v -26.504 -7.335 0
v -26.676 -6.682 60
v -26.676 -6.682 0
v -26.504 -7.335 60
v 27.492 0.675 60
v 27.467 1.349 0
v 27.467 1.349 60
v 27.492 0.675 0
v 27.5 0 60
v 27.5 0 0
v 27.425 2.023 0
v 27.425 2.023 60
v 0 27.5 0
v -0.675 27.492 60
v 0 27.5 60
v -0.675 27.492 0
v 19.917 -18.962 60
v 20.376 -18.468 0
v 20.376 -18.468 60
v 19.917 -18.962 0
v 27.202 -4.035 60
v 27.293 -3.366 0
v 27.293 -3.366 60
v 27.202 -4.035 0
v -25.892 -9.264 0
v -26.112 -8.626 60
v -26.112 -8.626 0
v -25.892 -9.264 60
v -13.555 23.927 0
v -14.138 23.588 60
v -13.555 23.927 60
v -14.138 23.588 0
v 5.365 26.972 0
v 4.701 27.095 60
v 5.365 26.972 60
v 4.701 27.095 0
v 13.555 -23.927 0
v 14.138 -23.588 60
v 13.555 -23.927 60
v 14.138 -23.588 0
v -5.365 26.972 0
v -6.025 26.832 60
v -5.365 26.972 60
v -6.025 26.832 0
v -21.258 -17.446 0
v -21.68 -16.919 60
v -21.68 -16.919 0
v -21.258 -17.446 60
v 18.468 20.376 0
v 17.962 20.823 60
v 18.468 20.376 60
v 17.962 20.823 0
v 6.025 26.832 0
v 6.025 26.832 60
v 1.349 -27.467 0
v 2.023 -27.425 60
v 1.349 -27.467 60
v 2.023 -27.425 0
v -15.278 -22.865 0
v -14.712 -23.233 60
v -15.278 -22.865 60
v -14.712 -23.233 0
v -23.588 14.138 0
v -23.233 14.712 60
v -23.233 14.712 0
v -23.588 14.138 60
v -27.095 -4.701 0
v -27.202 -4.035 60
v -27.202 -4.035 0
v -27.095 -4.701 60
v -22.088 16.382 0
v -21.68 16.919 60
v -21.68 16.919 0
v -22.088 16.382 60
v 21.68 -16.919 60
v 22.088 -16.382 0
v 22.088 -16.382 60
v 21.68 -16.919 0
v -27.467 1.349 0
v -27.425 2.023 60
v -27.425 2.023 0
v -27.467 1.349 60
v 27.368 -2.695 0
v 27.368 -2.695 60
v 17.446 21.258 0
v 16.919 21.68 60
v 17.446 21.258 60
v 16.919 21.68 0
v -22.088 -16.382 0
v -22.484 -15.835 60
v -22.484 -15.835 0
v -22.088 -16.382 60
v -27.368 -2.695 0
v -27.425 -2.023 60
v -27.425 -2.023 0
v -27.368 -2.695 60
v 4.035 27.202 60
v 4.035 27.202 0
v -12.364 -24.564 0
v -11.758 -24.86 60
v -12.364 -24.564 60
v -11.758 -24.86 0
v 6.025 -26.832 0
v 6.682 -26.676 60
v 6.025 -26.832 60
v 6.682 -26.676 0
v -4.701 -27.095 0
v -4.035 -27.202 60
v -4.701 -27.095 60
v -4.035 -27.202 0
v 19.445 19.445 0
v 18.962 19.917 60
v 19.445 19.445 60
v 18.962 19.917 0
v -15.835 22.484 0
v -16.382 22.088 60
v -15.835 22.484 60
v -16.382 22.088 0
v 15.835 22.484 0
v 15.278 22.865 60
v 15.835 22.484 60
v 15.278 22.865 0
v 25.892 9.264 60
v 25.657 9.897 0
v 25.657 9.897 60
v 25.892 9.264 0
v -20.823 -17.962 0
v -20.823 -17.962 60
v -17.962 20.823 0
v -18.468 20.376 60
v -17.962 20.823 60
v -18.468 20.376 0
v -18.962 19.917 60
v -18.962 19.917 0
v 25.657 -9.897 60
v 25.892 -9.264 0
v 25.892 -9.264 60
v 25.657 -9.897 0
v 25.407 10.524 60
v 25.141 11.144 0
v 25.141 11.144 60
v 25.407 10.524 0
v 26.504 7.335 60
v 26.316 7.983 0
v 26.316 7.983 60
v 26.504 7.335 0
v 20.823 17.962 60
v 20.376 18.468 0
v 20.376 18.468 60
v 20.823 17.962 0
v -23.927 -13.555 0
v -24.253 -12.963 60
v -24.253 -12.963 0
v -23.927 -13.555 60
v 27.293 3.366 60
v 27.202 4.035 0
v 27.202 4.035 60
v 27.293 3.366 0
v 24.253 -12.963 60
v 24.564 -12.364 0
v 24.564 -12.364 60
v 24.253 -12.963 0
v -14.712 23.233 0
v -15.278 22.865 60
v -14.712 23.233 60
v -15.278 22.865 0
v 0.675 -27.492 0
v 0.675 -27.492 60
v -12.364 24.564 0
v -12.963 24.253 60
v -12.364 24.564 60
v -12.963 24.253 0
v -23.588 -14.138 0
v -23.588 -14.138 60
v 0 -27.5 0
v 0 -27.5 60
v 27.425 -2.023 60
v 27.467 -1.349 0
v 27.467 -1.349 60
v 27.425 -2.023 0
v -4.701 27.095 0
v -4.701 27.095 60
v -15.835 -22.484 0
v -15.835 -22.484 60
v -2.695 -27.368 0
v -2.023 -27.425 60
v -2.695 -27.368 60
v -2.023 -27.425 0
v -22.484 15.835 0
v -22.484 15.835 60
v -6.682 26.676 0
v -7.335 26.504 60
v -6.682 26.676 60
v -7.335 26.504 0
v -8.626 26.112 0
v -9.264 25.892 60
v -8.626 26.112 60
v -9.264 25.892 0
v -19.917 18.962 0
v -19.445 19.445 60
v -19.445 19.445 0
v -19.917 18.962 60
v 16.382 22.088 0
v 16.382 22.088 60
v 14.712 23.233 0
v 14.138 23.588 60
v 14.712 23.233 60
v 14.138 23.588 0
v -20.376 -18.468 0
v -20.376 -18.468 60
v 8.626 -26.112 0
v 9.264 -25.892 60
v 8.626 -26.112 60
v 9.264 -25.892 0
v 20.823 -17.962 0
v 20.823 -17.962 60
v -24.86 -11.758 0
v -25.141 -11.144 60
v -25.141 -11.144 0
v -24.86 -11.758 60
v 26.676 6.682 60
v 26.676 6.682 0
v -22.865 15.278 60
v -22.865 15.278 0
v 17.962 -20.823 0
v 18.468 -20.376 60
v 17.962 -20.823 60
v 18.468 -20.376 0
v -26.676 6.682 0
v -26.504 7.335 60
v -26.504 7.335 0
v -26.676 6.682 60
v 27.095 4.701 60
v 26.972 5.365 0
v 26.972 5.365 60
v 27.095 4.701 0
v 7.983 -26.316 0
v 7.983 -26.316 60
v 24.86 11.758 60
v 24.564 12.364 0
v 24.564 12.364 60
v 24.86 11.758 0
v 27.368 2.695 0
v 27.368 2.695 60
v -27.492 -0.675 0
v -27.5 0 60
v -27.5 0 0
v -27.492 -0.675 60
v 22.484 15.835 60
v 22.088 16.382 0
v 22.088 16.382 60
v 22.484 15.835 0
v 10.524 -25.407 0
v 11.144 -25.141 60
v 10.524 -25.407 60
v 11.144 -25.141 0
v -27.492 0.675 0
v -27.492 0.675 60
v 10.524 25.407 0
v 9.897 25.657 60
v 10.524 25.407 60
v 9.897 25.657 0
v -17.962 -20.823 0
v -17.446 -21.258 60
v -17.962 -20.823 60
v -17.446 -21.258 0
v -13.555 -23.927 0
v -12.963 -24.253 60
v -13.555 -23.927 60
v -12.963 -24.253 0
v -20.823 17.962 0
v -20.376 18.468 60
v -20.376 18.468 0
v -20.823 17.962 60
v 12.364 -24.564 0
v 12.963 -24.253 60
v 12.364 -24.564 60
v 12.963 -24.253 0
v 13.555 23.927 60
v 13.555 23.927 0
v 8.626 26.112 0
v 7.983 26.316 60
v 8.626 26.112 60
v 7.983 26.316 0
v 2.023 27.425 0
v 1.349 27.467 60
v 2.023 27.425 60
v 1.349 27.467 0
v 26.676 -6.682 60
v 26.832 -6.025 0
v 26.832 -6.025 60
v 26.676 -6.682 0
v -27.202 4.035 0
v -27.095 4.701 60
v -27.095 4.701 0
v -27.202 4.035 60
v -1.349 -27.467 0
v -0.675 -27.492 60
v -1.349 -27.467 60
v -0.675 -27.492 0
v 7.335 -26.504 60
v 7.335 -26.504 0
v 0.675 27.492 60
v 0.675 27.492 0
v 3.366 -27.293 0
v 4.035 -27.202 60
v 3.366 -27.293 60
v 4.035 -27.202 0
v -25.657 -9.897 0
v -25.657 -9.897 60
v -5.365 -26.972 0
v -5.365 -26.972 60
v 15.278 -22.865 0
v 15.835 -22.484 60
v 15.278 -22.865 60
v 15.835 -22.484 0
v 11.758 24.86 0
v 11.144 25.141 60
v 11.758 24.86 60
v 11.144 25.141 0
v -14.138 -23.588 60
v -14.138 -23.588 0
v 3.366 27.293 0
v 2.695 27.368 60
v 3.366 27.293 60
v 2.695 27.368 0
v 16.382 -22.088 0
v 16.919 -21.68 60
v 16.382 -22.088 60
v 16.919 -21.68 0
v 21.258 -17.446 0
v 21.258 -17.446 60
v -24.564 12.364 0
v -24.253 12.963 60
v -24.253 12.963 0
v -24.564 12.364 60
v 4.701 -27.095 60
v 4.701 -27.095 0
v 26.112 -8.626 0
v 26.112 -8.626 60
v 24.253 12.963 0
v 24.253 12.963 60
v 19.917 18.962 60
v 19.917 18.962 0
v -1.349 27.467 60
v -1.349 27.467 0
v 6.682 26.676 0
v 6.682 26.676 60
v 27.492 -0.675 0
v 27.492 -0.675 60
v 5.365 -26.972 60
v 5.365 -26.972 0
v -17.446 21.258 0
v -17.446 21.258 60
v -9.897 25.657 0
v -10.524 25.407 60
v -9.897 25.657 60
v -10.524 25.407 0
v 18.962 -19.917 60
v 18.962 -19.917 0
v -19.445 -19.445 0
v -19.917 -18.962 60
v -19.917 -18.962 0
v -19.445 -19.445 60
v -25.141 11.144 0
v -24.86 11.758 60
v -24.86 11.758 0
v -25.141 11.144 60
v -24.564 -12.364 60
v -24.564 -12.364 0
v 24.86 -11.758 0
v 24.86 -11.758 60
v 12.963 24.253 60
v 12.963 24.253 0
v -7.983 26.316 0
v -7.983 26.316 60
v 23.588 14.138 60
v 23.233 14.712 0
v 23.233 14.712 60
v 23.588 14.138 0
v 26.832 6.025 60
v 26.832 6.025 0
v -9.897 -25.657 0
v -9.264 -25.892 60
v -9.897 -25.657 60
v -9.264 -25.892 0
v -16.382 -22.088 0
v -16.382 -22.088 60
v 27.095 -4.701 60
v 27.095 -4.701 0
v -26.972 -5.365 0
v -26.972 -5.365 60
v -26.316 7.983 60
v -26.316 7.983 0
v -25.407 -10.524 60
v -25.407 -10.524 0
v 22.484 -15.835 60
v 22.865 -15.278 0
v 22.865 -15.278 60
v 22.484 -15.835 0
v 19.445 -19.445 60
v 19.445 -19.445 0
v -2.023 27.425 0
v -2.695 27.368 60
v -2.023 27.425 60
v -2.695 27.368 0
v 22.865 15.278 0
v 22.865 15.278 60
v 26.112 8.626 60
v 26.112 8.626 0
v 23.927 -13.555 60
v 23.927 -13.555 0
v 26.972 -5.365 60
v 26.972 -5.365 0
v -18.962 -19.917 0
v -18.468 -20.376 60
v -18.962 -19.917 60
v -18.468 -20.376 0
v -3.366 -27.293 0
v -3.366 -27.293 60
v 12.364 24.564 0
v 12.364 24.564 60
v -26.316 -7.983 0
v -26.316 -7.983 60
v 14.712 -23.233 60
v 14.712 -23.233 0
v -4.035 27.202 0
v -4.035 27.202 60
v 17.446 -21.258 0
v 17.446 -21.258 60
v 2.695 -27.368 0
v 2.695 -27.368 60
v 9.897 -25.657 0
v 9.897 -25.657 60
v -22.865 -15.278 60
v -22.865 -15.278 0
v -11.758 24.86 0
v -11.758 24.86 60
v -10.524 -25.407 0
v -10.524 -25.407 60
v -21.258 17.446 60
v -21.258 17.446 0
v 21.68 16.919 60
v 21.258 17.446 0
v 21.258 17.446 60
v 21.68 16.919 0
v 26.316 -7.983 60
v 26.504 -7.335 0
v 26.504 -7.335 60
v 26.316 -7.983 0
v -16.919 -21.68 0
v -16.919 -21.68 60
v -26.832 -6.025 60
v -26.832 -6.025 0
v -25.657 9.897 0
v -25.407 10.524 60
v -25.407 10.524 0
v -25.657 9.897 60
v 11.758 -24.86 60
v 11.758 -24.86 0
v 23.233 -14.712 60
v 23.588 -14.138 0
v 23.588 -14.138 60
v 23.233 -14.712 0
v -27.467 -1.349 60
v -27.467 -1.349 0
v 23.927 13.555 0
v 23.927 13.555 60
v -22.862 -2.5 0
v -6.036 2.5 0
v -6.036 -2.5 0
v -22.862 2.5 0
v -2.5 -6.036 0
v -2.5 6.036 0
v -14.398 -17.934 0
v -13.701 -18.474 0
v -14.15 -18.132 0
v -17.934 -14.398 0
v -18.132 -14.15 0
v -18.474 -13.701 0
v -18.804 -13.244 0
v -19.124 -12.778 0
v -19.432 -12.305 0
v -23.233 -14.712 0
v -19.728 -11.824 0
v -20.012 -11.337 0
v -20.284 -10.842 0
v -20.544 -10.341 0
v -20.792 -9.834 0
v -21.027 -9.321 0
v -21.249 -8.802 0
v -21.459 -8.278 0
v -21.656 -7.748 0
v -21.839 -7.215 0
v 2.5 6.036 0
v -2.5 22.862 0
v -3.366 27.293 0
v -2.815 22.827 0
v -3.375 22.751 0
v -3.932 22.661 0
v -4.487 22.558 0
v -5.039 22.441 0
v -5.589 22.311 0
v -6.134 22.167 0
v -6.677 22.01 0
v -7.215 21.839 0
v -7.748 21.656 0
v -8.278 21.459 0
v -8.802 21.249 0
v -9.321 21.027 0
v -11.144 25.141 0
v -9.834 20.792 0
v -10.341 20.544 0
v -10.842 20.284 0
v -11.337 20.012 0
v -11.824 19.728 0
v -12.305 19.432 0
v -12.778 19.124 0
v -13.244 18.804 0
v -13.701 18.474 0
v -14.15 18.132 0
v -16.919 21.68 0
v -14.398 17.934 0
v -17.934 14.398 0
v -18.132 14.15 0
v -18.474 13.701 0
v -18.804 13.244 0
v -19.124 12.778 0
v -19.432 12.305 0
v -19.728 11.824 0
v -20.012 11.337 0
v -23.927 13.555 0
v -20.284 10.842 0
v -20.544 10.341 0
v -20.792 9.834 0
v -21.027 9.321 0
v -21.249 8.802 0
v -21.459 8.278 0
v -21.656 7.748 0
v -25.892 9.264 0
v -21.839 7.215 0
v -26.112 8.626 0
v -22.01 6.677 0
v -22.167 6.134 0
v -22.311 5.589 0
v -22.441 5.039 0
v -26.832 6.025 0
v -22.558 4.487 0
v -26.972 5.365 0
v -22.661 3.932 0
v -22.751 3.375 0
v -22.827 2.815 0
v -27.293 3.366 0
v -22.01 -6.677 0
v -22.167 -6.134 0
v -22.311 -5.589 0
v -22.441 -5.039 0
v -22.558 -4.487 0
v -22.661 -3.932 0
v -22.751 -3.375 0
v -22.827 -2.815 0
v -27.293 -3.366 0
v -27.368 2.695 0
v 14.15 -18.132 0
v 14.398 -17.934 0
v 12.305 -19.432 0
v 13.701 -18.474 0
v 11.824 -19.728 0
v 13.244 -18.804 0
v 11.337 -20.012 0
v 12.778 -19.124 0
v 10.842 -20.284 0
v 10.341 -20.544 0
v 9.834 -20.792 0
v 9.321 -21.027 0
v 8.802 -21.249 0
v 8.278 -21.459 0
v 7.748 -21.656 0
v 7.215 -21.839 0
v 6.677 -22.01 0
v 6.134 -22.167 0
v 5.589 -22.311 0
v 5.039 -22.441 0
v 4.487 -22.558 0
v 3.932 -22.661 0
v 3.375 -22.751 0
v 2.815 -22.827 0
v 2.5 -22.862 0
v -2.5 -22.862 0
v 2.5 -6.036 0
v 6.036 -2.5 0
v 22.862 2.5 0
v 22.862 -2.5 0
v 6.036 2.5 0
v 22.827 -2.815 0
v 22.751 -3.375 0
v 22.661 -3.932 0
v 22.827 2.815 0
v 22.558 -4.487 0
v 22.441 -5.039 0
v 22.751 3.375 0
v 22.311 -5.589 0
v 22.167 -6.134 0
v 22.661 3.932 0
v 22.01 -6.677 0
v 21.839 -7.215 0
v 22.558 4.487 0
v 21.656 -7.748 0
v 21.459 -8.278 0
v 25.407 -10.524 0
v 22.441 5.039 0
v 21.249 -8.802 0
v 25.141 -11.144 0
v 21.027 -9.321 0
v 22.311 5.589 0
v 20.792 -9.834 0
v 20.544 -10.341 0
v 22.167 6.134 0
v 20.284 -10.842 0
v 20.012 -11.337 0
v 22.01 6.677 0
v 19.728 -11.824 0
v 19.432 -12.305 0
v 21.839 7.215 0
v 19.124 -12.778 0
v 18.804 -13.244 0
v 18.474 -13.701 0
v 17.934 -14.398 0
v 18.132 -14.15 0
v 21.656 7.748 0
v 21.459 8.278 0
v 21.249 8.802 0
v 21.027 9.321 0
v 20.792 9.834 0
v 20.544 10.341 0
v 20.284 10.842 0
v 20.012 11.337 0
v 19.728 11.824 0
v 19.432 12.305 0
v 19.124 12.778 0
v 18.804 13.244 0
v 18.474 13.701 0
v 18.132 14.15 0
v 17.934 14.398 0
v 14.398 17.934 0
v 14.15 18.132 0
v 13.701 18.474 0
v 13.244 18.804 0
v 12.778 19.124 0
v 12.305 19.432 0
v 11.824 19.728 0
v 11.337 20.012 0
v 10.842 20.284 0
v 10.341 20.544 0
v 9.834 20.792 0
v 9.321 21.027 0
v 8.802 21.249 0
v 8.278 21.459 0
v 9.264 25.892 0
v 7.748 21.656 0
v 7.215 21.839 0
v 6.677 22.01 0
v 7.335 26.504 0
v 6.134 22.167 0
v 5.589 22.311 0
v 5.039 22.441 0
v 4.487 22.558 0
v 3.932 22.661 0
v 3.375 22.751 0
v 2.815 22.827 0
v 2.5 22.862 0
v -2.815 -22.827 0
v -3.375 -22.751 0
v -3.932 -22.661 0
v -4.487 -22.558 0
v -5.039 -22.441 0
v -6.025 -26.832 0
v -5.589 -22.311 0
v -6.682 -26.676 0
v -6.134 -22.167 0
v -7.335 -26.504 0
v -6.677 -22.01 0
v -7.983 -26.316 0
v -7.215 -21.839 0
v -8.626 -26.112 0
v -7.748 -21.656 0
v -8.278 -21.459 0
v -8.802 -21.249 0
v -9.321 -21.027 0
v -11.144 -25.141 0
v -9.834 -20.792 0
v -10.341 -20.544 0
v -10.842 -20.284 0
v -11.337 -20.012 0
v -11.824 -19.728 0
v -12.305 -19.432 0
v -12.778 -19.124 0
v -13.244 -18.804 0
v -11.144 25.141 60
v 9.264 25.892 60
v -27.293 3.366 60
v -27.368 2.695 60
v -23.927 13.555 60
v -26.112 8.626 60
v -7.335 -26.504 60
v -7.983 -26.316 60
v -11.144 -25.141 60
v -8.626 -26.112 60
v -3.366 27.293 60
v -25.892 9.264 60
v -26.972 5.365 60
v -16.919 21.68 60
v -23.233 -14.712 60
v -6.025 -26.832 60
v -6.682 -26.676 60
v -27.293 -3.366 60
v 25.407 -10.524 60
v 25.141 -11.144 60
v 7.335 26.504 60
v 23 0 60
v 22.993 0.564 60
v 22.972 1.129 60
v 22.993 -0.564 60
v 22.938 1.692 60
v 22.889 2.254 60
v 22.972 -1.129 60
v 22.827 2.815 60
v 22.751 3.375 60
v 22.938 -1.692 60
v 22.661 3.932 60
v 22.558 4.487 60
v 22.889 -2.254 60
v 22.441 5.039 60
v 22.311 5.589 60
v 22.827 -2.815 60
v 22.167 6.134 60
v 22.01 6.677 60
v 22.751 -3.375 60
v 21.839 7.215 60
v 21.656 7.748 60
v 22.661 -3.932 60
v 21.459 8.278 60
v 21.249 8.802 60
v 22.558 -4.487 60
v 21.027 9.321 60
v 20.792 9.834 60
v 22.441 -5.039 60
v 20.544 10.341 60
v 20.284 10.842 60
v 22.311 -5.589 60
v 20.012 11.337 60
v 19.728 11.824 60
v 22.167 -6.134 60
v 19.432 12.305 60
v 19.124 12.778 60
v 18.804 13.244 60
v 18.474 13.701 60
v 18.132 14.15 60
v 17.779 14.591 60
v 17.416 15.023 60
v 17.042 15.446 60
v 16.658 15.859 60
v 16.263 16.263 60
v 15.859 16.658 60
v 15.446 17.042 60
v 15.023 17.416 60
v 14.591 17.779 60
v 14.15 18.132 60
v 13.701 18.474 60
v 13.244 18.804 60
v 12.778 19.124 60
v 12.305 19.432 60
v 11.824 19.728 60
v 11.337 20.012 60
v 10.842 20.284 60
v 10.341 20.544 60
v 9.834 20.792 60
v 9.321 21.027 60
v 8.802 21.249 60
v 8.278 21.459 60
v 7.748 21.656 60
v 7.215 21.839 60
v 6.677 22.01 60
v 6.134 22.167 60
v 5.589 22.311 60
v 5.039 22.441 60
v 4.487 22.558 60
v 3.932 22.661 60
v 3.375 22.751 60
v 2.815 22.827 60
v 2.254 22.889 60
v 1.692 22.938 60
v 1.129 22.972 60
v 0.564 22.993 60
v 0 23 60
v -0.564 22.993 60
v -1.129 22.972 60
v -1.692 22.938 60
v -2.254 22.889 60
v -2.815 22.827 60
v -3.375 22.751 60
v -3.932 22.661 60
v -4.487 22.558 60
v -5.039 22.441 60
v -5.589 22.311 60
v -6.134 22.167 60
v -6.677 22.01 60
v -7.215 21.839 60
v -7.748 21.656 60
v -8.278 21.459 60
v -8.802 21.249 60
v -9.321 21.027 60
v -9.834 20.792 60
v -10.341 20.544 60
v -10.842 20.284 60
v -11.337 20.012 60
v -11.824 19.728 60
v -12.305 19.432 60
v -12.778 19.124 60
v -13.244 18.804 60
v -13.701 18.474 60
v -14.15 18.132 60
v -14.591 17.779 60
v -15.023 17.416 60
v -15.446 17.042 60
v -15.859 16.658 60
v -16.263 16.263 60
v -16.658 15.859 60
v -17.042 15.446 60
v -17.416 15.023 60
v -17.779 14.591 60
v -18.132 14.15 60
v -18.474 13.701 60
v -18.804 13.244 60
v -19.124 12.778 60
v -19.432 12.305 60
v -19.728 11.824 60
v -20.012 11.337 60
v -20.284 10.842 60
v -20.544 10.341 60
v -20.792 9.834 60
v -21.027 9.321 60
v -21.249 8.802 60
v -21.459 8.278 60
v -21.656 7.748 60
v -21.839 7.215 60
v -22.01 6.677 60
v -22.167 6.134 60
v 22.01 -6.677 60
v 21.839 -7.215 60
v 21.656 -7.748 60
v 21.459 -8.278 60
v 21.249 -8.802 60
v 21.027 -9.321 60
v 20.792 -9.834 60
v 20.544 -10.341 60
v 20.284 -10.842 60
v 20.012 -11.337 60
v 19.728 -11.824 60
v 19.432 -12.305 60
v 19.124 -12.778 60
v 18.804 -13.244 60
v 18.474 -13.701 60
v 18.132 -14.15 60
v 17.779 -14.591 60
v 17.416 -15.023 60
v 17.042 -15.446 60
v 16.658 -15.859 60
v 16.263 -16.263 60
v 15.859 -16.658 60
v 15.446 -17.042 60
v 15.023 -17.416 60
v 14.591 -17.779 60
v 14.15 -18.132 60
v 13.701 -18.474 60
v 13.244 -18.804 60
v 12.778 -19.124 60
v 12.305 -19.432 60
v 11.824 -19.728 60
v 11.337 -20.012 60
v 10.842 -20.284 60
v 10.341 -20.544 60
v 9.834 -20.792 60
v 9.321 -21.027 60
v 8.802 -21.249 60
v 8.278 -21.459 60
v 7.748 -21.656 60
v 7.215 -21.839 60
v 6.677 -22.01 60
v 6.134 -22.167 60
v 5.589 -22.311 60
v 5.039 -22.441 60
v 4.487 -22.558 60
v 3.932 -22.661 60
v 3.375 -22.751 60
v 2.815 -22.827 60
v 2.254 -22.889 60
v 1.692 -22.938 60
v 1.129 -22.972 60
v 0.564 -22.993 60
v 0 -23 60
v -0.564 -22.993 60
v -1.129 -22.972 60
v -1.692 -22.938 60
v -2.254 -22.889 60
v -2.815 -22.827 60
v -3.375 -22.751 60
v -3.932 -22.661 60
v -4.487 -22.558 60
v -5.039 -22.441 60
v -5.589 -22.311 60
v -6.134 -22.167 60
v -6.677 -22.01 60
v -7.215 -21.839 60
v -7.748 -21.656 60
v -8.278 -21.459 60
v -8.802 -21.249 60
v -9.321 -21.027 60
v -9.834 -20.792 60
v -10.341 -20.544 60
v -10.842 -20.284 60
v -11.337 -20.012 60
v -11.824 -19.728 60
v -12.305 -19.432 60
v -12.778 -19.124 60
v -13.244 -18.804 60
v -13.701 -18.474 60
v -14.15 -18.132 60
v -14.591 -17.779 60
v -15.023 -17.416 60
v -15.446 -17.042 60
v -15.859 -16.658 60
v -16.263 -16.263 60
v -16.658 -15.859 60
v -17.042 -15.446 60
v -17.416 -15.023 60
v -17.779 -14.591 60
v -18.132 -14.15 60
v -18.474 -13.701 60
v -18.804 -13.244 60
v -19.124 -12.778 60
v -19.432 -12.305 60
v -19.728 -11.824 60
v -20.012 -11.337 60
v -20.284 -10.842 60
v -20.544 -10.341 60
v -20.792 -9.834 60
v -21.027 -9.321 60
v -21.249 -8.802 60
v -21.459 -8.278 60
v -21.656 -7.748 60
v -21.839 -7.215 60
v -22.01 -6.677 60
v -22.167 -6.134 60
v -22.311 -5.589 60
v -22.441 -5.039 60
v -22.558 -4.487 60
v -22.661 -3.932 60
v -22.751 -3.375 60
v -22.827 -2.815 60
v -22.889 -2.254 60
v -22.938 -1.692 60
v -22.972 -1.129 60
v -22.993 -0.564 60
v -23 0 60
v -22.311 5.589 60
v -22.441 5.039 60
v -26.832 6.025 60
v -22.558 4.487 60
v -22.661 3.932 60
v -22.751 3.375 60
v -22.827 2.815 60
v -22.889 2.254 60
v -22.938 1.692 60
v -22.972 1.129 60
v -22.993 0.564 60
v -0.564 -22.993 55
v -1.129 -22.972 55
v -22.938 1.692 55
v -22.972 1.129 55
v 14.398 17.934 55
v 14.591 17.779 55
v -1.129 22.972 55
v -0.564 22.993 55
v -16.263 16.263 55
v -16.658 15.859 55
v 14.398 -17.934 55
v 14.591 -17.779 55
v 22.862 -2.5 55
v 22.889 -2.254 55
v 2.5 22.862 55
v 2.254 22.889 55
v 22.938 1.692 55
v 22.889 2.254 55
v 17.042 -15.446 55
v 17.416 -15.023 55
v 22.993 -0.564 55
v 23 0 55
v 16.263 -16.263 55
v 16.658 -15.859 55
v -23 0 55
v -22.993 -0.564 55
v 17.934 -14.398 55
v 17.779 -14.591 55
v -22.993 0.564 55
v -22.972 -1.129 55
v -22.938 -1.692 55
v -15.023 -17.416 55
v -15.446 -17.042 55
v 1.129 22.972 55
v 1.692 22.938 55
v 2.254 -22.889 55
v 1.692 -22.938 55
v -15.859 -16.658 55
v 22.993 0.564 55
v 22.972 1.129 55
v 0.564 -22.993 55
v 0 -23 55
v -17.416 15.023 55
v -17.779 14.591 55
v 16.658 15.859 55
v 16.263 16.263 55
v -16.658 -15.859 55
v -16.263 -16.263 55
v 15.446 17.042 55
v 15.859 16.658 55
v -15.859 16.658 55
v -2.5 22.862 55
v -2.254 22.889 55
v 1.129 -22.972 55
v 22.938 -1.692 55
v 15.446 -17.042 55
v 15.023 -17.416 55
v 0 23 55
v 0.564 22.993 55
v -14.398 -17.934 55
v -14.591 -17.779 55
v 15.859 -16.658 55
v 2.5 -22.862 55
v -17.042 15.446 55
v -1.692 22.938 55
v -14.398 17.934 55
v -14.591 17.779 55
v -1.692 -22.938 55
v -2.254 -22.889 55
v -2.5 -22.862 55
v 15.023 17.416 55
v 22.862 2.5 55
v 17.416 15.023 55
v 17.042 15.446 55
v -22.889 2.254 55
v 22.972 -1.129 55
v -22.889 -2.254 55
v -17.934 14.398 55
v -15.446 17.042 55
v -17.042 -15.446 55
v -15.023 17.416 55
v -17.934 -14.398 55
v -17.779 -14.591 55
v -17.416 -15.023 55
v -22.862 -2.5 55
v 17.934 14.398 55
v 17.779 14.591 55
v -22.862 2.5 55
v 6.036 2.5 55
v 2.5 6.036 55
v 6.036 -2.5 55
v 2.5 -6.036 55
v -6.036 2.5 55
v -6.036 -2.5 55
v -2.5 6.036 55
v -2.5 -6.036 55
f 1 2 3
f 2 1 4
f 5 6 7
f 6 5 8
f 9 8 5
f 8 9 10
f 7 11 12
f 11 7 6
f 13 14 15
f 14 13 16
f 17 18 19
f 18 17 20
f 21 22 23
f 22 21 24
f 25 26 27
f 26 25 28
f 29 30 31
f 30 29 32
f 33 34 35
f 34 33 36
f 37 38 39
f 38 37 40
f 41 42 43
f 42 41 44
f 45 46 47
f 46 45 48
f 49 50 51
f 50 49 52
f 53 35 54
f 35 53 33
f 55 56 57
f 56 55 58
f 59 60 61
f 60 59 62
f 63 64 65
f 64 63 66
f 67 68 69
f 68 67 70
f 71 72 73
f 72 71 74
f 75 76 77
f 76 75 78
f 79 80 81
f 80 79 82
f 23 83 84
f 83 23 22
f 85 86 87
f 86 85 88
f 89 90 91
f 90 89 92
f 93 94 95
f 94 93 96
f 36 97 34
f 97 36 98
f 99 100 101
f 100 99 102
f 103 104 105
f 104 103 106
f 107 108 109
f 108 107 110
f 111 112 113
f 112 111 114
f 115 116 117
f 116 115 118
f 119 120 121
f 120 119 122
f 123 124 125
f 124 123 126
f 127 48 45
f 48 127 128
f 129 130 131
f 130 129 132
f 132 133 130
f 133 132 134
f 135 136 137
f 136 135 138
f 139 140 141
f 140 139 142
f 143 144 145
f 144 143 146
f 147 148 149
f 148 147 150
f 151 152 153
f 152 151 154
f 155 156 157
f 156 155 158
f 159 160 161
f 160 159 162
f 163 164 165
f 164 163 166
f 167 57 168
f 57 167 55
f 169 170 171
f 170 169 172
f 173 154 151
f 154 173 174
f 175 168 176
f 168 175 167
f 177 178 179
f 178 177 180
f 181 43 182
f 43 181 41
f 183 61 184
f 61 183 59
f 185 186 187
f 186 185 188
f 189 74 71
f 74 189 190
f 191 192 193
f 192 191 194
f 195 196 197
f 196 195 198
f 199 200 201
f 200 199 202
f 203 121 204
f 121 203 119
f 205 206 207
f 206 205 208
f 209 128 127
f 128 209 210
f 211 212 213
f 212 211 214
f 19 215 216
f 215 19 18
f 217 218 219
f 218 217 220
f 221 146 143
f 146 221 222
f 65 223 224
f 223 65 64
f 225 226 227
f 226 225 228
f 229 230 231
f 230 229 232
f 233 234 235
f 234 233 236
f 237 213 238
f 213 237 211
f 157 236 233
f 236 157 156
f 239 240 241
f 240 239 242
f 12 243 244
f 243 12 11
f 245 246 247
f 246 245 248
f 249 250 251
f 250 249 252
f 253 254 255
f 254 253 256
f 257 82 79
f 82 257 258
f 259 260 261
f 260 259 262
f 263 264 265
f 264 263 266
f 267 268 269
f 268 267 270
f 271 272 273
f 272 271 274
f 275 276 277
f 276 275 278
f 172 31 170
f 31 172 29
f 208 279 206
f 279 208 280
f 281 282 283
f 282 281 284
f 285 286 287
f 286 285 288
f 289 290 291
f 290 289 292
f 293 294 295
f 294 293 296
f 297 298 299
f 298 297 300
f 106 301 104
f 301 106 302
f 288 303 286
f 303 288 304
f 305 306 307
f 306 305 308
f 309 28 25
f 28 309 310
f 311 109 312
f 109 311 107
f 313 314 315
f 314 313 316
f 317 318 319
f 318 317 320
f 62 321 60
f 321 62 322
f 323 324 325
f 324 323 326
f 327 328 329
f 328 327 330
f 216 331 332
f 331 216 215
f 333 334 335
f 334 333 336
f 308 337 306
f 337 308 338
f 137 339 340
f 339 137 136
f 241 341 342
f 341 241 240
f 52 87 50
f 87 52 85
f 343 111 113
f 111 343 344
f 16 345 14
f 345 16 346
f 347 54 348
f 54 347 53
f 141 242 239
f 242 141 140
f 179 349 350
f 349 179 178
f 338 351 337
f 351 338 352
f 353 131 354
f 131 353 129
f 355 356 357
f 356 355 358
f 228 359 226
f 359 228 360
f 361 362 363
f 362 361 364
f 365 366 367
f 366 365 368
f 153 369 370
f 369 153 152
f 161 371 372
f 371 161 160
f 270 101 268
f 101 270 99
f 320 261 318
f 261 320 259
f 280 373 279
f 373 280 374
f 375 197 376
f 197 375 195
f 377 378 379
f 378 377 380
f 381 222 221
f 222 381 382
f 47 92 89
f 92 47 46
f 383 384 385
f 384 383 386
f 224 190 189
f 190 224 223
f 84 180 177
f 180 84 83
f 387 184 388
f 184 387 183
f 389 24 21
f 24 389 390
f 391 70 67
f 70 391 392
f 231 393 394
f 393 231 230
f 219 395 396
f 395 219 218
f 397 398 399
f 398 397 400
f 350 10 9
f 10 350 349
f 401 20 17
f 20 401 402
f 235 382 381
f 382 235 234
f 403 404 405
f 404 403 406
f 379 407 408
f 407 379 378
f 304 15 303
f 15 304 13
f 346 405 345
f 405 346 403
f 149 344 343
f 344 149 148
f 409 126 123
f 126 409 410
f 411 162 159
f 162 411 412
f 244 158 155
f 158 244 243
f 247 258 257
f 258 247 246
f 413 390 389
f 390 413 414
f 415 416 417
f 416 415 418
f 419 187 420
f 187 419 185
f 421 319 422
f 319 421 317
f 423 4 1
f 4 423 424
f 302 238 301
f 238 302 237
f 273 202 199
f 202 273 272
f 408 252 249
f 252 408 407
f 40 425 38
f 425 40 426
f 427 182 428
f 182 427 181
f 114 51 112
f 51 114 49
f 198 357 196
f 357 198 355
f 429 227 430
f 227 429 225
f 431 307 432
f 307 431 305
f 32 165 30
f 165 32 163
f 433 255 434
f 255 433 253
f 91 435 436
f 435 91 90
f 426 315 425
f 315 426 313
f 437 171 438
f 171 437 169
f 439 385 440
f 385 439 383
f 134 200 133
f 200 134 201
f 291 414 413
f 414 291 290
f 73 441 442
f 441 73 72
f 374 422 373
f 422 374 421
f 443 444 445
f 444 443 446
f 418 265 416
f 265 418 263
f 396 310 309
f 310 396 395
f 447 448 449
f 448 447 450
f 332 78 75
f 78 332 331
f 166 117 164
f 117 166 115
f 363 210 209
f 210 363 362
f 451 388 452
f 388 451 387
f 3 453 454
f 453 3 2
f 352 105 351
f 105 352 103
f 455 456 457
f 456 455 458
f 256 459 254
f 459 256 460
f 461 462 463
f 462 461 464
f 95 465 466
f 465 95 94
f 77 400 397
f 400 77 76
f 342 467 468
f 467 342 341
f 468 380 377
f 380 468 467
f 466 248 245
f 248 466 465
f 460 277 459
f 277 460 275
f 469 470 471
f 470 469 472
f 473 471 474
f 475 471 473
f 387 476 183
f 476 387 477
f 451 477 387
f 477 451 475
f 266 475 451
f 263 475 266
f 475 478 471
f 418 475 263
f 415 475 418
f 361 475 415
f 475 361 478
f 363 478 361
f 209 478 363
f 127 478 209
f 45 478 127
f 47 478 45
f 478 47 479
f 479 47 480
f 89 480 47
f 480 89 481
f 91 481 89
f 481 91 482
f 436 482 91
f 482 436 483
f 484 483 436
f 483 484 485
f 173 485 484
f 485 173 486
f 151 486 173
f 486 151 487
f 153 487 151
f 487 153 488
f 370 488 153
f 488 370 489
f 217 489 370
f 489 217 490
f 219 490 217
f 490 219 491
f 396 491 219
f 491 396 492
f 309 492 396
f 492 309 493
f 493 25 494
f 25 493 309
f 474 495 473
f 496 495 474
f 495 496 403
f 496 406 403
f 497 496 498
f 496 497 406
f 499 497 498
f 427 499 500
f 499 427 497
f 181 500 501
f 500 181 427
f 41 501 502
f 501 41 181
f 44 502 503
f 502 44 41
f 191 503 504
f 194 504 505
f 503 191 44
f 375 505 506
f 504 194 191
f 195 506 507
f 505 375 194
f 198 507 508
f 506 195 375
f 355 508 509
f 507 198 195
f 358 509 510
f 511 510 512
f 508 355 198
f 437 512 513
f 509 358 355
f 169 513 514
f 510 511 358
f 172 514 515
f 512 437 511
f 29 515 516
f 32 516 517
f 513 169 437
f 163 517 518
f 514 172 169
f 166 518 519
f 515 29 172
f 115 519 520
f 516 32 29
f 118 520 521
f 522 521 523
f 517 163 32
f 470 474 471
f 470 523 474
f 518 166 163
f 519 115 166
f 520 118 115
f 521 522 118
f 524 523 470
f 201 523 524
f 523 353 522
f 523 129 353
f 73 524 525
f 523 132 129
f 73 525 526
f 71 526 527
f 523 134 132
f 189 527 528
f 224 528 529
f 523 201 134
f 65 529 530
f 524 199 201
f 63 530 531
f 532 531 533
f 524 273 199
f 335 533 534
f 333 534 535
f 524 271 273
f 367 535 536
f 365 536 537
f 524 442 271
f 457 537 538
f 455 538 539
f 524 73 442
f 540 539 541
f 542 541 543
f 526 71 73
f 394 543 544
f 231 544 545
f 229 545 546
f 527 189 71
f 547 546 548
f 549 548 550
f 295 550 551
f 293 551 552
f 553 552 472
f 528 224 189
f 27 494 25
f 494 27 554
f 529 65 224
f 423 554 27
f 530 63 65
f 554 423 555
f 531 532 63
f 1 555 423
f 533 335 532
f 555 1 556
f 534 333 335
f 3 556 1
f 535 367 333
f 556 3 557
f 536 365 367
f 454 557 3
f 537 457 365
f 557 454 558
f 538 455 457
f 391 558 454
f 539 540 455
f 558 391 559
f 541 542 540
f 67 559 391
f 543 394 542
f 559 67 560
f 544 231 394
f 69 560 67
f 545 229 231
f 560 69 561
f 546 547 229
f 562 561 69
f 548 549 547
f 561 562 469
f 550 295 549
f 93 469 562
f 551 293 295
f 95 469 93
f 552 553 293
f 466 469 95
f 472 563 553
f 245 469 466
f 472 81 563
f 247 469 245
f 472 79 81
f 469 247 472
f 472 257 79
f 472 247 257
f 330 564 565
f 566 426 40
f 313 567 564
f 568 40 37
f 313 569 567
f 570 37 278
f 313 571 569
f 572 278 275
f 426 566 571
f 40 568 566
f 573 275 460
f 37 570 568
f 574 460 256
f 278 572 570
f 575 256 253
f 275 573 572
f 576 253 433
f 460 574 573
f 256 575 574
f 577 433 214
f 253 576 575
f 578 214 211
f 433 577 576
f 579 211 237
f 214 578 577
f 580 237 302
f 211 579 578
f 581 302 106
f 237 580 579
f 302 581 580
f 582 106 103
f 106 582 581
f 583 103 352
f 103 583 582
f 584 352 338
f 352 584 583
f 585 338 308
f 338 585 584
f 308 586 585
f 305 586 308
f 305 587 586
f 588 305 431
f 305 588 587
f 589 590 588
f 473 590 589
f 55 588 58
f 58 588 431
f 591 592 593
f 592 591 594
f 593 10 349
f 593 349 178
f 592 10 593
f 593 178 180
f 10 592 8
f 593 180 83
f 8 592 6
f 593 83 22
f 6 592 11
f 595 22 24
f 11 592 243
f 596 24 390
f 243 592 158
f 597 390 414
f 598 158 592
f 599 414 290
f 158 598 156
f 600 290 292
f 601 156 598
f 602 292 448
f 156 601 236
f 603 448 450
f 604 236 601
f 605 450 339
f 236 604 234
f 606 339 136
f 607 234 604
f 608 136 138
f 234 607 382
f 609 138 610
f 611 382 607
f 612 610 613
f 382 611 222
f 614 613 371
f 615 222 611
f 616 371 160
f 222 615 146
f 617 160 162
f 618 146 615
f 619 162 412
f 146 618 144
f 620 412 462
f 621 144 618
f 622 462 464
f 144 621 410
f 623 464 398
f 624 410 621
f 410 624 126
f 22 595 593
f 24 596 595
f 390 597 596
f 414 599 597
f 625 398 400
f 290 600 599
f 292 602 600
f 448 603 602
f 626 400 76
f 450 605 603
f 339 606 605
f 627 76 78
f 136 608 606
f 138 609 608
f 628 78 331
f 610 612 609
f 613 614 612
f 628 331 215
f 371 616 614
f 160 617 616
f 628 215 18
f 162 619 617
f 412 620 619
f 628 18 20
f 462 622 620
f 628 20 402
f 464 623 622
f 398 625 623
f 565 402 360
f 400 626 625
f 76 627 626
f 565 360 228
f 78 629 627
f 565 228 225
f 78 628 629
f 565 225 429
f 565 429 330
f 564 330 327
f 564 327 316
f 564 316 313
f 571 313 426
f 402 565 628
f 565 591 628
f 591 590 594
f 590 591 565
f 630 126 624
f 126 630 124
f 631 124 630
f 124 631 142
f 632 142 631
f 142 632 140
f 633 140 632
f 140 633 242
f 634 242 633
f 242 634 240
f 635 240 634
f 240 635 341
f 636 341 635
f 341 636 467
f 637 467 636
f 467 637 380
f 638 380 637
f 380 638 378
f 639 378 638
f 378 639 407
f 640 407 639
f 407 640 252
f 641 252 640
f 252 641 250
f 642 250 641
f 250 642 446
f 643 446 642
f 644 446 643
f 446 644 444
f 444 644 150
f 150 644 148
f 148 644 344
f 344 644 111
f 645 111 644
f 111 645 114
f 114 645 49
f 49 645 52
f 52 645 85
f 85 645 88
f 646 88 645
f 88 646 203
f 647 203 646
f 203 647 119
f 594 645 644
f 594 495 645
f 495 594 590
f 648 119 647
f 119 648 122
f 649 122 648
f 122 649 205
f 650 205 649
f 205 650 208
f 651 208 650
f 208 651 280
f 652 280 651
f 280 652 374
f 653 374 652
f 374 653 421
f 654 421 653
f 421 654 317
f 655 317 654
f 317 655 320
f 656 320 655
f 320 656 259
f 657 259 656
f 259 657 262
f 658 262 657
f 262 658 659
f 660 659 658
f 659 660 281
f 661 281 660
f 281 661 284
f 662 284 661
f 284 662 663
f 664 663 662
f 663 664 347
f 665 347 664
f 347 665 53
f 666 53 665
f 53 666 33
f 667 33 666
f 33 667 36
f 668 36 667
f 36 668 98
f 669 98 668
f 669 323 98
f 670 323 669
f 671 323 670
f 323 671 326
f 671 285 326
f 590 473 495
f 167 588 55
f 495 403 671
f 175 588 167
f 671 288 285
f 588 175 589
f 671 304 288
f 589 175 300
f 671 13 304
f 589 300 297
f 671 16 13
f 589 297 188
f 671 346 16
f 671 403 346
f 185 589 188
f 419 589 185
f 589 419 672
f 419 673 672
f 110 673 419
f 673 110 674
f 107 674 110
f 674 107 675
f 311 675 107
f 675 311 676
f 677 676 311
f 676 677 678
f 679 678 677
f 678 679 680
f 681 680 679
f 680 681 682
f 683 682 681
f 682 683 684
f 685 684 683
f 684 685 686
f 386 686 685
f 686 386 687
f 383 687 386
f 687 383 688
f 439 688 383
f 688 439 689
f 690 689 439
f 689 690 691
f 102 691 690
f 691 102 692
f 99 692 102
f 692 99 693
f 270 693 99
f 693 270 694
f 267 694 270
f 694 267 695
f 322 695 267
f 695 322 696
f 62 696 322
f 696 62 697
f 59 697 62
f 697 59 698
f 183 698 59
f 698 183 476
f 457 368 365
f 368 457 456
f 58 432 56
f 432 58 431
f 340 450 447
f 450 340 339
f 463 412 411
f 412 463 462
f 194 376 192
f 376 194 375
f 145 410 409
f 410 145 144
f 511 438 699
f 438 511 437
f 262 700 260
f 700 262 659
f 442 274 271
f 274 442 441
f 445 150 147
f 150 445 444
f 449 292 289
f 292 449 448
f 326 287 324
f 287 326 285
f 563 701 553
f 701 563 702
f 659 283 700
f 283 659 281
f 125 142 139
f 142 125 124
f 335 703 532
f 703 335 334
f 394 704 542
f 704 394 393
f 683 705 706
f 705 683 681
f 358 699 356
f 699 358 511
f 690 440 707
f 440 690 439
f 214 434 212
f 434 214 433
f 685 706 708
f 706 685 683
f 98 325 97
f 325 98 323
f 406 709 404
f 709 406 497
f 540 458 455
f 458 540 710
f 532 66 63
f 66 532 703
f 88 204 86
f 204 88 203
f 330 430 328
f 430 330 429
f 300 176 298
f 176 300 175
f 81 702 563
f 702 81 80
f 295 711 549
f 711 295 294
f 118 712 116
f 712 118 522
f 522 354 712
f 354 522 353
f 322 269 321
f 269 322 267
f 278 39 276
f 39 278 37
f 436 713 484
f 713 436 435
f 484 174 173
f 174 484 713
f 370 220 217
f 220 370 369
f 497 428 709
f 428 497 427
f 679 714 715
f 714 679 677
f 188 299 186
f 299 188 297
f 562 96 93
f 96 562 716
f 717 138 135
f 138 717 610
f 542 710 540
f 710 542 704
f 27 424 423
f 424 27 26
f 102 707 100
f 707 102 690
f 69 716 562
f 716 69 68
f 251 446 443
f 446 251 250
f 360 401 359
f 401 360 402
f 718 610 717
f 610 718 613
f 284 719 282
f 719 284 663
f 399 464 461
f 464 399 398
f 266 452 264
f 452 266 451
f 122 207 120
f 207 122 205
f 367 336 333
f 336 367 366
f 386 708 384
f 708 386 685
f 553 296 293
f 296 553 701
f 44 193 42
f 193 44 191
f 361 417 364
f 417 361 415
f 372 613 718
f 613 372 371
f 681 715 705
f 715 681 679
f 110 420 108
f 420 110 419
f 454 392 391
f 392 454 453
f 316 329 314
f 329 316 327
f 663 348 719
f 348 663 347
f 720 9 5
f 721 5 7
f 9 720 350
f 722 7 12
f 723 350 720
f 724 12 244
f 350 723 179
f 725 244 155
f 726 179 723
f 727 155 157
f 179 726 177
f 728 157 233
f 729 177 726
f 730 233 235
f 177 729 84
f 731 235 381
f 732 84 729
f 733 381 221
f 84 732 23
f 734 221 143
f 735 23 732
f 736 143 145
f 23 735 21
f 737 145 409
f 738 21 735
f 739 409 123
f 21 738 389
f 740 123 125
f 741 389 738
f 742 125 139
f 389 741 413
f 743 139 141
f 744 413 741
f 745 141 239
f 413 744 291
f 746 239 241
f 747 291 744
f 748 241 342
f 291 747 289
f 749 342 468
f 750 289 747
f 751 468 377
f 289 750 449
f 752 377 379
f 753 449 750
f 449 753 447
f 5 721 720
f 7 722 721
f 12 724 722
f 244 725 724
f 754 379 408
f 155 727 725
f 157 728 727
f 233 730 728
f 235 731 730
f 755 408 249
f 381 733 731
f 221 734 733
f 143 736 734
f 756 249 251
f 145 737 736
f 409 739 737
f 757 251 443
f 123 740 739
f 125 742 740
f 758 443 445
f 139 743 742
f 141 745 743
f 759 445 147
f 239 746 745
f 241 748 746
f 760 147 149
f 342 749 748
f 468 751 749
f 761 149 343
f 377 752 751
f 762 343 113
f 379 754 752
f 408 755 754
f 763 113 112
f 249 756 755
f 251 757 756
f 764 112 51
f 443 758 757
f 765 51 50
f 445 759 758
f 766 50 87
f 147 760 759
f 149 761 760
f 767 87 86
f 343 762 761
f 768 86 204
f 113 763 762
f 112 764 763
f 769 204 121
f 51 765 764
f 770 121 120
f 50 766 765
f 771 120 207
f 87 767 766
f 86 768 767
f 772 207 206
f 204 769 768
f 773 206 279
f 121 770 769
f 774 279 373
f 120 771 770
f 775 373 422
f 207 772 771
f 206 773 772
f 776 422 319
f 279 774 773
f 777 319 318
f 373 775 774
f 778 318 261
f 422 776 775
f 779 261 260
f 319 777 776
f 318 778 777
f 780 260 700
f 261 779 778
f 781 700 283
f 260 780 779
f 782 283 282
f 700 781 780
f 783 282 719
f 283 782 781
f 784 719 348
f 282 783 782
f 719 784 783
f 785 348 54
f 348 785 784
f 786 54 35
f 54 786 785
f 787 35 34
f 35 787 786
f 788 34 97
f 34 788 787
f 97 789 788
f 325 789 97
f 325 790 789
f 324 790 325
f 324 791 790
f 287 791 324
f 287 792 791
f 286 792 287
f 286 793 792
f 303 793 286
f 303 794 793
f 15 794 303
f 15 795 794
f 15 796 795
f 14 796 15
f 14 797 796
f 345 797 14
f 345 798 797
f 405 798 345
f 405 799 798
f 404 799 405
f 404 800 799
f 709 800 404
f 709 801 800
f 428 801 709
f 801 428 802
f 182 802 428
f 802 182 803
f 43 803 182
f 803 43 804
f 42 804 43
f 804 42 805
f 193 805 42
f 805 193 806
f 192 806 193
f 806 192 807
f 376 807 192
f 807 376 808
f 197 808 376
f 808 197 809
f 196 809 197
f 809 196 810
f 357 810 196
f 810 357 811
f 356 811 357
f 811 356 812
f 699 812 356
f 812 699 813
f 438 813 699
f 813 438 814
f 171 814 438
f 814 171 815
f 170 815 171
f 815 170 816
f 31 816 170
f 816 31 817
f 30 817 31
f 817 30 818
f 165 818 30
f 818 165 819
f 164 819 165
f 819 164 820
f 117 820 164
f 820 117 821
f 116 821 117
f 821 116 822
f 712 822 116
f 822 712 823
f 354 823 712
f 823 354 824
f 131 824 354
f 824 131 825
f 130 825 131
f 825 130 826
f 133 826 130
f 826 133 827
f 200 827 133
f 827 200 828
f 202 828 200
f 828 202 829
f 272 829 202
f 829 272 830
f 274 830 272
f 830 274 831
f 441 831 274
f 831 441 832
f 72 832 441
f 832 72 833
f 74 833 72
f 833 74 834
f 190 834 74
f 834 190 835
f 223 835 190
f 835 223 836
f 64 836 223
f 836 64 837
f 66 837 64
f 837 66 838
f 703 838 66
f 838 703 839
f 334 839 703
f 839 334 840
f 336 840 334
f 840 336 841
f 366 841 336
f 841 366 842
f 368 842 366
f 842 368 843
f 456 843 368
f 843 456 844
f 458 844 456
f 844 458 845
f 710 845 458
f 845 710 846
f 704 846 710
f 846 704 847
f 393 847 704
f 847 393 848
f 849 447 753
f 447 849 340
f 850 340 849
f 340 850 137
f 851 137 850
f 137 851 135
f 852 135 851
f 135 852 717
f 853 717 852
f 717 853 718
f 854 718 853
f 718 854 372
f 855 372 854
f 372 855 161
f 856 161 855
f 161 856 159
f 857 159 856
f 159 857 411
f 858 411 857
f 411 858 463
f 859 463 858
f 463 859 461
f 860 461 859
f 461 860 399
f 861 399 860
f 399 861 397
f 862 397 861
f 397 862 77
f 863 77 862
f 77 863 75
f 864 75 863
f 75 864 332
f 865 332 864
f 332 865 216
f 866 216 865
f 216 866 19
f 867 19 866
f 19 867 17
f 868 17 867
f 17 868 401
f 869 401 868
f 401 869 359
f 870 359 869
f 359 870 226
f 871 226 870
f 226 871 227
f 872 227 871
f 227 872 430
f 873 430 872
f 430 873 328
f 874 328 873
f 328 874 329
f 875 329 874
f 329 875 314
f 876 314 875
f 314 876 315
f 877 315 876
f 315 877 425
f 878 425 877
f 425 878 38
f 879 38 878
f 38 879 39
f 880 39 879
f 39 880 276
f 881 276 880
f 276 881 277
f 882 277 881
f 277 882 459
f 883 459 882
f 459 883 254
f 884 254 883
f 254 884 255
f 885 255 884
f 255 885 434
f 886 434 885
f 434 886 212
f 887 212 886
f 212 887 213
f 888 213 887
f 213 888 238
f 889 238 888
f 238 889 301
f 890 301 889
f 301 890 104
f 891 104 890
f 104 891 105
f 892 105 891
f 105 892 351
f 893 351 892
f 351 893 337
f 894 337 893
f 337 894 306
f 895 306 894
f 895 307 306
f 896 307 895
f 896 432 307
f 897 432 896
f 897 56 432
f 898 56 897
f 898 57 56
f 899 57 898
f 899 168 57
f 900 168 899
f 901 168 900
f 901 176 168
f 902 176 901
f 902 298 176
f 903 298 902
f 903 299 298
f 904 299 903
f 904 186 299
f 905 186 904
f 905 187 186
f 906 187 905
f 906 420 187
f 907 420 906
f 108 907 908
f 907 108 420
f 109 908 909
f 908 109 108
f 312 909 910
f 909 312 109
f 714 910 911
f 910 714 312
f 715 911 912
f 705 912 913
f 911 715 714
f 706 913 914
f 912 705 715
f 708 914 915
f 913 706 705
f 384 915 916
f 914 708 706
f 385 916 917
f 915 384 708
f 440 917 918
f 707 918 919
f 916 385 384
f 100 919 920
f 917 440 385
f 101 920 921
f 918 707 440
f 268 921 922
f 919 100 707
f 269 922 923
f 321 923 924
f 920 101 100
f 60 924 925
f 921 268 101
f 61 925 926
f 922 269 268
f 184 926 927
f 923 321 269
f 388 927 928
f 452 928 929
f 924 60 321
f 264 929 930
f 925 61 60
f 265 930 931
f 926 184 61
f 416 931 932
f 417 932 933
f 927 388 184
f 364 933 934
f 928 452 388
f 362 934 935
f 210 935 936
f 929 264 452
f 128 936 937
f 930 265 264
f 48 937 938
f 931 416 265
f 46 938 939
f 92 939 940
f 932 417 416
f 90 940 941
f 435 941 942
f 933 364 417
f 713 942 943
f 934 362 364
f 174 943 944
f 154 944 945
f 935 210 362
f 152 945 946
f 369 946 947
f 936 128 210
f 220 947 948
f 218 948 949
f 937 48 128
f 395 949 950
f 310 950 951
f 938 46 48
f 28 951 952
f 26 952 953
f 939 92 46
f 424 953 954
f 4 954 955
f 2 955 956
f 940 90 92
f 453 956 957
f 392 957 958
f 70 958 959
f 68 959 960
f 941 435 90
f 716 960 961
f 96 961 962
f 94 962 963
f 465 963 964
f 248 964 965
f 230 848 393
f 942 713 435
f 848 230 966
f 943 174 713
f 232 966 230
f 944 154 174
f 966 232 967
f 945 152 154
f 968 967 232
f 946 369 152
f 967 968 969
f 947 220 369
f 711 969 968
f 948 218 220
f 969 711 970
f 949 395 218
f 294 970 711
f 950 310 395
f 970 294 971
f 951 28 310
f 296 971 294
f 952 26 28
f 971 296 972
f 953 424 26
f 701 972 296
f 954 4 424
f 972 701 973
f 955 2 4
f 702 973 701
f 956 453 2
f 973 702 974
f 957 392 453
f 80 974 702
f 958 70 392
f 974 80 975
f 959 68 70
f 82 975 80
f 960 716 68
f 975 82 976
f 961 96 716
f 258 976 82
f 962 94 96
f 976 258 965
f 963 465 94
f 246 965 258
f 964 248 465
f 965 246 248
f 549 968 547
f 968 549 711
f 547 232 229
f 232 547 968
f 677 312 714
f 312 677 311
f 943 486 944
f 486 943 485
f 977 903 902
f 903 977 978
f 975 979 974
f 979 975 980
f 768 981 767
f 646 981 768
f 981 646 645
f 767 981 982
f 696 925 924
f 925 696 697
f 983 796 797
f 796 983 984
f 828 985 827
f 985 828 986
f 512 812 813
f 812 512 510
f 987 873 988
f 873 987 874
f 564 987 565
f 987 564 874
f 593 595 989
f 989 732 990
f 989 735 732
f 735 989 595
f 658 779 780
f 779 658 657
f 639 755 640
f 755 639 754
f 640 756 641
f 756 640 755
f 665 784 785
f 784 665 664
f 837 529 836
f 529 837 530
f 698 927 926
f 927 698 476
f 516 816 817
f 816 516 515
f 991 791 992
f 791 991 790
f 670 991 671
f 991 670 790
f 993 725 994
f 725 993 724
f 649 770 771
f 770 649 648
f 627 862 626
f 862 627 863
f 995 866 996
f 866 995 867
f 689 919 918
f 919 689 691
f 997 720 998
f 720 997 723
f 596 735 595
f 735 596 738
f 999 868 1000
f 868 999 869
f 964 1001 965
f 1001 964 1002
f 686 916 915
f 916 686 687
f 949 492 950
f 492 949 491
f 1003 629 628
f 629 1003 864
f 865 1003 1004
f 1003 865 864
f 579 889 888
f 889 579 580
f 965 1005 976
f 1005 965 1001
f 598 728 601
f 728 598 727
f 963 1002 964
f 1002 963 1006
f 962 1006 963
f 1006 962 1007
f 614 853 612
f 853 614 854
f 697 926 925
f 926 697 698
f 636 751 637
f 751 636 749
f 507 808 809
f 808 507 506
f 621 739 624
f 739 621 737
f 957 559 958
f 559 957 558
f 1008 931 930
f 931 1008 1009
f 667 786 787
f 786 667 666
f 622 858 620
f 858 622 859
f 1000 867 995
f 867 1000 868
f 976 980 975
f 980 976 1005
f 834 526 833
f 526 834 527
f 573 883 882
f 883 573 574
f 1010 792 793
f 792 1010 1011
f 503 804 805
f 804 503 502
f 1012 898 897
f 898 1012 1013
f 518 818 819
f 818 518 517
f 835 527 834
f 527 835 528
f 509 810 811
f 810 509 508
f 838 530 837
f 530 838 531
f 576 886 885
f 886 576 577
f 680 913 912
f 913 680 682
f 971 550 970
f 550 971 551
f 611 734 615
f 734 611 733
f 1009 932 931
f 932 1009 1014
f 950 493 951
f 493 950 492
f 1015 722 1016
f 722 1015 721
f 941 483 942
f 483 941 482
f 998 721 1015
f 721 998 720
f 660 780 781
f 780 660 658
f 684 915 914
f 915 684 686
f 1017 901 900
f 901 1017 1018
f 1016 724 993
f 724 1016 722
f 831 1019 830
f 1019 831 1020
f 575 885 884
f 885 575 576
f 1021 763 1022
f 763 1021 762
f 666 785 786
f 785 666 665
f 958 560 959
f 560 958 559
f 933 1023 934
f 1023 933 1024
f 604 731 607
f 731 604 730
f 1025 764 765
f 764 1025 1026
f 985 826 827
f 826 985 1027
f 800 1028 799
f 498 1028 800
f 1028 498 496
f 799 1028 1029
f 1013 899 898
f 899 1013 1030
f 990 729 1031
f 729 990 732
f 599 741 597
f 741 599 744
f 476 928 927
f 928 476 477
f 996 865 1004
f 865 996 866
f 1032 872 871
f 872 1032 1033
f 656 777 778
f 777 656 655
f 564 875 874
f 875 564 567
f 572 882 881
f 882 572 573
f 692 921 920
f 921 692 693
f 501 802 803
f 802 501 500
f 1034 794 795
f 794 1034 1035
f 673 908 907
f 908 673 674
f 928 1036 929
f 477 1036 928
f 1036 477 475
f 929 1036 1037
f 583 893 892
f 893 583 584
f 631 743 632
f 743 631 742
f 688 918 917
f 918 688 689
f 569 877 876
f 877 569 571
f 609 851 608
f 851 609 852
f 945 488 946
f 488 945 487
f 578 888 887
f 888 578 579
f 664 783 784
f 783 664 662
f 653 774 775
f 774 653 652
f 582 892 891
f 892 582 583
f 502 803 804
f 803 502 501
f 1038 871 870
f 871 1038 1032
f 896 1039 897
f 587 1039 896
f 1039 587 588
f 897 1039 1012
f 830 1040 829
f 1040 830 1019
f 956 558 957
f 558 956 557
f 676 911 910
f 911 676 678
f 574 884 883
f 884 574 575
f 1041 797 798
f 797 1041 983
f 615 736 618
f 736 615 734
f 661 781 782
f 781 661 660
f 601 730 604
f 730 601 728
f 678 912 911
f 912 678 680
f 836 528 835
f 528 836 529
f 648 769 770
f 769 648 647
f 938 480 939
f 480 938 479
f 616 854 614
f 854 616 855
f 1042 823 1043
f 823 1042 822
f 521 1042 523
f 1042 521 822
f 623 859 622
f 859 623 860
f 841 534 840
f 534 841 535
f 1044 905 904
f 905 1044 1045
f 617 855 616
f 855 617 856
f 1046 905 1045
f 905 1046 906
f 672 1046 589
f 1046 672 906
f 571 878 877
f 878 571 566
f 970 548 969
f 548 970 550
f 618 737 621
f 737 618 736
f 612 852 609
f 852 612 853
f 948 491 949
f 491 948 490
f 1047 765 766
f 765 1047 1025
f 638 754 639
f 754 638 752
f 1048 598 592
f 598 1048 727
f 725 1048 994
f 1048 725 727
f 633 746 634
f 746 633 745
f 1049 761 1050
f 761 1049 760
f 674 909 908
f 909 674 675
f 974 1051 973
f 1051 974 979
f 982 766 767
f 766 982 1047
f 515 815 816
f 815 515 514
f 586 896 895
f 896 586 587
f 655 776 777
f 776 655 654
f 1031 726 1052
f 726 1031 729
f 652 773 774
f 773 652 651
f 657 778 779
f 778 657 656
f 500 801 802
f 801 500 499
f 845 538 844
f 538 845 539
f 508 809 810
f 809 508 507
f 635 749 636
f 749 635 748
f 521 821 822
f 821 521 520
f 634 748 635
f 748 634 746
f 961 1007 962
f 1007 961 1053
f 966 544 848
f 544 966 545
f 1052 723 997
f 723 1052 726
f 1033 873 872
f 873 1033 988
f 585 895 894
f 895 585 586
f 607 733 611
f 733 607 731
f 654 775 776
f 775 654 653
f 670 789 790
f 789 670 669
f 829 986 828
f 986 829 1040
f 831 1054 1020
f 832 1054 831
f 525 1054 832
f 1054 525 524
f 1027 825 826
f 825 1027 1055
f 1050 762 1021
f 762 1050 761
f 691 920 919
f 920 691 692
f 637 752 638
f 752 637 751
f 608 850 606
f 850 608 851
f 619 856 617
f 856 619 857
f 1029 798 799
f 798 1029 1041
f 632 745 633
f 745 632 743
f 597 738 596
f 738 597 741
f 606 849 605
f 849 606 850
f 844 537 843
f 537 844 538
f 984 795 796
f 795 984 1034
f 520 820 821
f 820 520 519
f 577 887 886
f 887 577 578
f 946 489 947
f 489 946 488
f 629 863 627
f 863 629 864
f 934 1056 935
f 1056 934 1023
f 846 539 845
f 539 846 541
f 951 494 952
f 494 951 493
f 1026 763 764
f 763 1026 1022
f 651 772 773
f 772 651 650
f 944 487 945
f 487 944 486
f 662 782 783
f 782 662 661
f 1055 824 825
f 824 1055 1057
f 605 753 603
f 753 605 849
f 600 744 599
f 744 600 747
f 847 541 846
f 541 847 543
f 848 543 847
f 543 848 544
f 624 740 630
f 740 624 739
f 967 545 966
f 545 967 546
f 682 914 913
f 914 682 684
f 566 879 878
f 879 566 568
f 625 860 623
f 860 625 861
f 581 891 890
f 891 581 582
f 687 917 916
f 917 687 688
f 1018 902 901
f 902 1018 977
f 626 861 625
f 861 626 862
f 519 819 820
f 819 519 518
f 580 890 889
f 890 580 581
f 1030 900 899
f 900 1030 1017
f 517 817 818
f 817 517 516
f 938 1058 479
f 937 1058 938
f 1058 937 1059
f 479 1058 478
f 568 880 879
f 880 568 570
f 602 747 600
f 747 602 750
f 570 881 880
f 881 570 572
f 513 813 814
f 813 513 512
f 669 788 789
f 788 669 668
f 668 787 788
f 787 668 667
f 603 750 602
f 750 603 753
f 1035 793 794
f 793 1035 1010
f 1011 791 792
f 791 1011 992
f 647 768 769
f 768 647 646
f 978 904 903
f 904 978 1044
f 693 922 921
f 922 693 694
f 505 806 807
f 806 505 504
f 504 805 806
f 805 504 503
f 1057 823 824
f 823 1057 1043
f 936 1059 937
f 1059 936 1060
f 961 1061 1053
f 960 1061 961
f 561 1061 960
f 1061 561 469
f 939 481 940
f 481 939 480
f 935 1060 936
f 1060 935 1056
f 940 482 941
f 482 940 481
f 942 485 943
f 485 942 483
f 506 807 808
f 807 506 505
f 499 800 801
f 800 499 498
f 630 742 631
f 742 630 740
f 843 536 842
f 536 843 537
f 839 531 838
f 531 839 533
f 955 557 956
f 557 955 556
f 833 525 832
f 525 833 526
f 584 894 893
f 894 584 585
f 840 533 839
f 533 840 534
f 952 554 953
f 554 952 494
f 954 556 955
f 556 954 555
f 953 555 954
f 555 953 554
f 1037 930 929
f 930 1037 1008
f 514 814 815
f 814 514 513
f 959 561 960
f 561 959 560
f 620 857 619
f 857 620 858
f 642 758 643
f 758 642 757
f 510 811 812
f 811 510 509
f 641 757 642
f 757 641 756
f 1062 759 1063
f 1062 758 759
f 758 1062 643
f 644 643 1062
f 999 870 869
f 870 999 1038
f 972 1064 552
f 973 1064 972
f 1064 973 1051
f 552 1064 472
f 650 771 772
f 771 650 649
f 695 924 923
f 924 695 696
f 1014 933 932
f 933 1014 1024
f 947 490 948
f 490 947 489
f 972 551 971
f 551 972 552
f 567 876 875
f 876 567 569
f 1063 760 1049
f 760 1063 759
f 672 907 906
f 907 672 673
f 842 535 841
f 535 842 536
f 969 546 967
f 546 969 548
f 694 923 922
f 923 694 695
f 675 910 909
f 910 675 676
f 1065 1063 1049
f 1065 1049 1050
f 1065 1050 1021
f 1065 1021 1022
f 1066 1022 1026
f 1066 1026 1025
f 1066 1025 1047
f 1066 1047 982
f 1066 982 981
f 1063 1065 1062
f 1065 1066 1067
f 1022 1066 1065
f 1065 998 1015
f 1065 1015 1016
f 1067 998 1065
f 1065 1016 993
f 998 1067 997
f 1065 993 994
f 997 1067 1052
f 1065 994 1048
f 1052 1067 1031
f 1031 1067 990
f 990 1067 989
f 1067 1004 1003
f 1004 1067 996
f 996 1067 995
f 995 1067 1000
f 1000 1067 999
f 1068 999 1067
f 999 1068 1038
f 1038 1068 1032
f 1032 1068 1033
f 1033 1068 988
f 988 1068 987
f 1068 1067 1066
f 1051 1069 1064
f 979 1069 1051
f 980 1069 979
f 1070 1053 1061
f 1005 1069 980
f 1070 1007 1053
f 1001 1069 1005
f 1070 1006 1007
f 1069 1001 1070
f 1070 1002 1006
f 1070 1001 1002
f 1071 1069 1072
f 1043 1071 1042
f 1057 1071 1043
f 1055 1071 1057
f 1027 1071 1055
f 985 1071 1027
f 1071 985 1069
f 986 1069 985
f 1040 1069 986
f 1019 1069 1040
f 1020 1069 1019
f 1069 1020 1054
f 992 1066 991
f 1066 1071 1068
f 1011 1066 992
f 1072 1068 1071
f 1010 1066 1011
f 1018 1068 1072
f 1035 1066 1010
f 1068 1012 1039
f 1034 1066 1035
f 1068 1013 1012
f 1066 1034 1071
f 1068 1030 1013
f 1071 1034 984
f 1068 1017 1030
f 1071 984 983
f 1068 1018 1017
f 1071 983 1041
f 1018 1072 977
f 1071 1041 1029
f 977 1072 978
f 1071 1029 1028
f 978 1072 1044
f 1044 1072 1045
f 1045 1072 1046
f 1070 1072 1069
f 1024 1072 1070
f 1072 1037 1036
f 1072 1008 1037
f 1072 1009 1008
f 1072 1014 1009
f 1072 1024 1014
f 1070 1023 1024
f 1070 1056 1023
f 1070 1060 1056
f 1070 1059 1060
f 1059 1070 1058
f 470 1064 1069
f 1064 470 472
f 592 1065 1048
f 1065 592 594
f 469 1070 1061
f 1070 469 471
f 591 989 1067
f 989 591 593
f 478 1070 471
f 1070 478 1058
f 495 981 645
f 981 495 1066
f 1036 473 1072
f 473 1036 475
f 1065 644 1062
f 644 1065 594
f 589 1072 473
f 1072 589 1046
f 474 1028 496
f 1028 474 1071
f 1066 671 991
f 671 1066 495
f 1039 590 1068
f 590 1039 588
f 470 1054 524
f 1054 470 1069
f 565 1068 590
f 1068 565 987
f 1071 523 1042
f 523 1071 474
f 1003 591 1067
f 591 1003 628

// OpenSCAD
// 地脚垫高圆筒 leg_riser_d55x60  (2026-09-14)
// 圆筒 外径 55 / 内径 46 / 高 60; 内部米字加强筋厚 5 (0/45/90/135°),
// 筋从底面做到 Z=55, 最上面 5mm 不做加强。
// 与 build_stl.py 的参数必须一致 (本文件是复刻不是 import)。

od        = 55;   // 外径
id        = 46;   // 内径
h         = 60;   // 总高
rib_t     = 5;    // 米字加强筋厚度
top_clear = 5;    // 最上面不做加强的高度

rib_h = h - top_clear;          // 55
rib_l = (id + od) / 2;          // 筋条总长, 两端伸进壁厚中线

module leg_riser_d55x60() {
    difference() {
        cylinder(h = h, d = od, $fn = 256);
        translate([0, 0, -1]) cylinder(h = h + 2, d = id, $fn = 256);
    }
    for (a = [0, 45, 90, 135])
        rotate([0, 0, a])
            translate([-rib_l / 2, -rib_t / 2, 0])
                cube([rib_l, rib_t, rib_h]);
}

leg_riser_d55x60();
